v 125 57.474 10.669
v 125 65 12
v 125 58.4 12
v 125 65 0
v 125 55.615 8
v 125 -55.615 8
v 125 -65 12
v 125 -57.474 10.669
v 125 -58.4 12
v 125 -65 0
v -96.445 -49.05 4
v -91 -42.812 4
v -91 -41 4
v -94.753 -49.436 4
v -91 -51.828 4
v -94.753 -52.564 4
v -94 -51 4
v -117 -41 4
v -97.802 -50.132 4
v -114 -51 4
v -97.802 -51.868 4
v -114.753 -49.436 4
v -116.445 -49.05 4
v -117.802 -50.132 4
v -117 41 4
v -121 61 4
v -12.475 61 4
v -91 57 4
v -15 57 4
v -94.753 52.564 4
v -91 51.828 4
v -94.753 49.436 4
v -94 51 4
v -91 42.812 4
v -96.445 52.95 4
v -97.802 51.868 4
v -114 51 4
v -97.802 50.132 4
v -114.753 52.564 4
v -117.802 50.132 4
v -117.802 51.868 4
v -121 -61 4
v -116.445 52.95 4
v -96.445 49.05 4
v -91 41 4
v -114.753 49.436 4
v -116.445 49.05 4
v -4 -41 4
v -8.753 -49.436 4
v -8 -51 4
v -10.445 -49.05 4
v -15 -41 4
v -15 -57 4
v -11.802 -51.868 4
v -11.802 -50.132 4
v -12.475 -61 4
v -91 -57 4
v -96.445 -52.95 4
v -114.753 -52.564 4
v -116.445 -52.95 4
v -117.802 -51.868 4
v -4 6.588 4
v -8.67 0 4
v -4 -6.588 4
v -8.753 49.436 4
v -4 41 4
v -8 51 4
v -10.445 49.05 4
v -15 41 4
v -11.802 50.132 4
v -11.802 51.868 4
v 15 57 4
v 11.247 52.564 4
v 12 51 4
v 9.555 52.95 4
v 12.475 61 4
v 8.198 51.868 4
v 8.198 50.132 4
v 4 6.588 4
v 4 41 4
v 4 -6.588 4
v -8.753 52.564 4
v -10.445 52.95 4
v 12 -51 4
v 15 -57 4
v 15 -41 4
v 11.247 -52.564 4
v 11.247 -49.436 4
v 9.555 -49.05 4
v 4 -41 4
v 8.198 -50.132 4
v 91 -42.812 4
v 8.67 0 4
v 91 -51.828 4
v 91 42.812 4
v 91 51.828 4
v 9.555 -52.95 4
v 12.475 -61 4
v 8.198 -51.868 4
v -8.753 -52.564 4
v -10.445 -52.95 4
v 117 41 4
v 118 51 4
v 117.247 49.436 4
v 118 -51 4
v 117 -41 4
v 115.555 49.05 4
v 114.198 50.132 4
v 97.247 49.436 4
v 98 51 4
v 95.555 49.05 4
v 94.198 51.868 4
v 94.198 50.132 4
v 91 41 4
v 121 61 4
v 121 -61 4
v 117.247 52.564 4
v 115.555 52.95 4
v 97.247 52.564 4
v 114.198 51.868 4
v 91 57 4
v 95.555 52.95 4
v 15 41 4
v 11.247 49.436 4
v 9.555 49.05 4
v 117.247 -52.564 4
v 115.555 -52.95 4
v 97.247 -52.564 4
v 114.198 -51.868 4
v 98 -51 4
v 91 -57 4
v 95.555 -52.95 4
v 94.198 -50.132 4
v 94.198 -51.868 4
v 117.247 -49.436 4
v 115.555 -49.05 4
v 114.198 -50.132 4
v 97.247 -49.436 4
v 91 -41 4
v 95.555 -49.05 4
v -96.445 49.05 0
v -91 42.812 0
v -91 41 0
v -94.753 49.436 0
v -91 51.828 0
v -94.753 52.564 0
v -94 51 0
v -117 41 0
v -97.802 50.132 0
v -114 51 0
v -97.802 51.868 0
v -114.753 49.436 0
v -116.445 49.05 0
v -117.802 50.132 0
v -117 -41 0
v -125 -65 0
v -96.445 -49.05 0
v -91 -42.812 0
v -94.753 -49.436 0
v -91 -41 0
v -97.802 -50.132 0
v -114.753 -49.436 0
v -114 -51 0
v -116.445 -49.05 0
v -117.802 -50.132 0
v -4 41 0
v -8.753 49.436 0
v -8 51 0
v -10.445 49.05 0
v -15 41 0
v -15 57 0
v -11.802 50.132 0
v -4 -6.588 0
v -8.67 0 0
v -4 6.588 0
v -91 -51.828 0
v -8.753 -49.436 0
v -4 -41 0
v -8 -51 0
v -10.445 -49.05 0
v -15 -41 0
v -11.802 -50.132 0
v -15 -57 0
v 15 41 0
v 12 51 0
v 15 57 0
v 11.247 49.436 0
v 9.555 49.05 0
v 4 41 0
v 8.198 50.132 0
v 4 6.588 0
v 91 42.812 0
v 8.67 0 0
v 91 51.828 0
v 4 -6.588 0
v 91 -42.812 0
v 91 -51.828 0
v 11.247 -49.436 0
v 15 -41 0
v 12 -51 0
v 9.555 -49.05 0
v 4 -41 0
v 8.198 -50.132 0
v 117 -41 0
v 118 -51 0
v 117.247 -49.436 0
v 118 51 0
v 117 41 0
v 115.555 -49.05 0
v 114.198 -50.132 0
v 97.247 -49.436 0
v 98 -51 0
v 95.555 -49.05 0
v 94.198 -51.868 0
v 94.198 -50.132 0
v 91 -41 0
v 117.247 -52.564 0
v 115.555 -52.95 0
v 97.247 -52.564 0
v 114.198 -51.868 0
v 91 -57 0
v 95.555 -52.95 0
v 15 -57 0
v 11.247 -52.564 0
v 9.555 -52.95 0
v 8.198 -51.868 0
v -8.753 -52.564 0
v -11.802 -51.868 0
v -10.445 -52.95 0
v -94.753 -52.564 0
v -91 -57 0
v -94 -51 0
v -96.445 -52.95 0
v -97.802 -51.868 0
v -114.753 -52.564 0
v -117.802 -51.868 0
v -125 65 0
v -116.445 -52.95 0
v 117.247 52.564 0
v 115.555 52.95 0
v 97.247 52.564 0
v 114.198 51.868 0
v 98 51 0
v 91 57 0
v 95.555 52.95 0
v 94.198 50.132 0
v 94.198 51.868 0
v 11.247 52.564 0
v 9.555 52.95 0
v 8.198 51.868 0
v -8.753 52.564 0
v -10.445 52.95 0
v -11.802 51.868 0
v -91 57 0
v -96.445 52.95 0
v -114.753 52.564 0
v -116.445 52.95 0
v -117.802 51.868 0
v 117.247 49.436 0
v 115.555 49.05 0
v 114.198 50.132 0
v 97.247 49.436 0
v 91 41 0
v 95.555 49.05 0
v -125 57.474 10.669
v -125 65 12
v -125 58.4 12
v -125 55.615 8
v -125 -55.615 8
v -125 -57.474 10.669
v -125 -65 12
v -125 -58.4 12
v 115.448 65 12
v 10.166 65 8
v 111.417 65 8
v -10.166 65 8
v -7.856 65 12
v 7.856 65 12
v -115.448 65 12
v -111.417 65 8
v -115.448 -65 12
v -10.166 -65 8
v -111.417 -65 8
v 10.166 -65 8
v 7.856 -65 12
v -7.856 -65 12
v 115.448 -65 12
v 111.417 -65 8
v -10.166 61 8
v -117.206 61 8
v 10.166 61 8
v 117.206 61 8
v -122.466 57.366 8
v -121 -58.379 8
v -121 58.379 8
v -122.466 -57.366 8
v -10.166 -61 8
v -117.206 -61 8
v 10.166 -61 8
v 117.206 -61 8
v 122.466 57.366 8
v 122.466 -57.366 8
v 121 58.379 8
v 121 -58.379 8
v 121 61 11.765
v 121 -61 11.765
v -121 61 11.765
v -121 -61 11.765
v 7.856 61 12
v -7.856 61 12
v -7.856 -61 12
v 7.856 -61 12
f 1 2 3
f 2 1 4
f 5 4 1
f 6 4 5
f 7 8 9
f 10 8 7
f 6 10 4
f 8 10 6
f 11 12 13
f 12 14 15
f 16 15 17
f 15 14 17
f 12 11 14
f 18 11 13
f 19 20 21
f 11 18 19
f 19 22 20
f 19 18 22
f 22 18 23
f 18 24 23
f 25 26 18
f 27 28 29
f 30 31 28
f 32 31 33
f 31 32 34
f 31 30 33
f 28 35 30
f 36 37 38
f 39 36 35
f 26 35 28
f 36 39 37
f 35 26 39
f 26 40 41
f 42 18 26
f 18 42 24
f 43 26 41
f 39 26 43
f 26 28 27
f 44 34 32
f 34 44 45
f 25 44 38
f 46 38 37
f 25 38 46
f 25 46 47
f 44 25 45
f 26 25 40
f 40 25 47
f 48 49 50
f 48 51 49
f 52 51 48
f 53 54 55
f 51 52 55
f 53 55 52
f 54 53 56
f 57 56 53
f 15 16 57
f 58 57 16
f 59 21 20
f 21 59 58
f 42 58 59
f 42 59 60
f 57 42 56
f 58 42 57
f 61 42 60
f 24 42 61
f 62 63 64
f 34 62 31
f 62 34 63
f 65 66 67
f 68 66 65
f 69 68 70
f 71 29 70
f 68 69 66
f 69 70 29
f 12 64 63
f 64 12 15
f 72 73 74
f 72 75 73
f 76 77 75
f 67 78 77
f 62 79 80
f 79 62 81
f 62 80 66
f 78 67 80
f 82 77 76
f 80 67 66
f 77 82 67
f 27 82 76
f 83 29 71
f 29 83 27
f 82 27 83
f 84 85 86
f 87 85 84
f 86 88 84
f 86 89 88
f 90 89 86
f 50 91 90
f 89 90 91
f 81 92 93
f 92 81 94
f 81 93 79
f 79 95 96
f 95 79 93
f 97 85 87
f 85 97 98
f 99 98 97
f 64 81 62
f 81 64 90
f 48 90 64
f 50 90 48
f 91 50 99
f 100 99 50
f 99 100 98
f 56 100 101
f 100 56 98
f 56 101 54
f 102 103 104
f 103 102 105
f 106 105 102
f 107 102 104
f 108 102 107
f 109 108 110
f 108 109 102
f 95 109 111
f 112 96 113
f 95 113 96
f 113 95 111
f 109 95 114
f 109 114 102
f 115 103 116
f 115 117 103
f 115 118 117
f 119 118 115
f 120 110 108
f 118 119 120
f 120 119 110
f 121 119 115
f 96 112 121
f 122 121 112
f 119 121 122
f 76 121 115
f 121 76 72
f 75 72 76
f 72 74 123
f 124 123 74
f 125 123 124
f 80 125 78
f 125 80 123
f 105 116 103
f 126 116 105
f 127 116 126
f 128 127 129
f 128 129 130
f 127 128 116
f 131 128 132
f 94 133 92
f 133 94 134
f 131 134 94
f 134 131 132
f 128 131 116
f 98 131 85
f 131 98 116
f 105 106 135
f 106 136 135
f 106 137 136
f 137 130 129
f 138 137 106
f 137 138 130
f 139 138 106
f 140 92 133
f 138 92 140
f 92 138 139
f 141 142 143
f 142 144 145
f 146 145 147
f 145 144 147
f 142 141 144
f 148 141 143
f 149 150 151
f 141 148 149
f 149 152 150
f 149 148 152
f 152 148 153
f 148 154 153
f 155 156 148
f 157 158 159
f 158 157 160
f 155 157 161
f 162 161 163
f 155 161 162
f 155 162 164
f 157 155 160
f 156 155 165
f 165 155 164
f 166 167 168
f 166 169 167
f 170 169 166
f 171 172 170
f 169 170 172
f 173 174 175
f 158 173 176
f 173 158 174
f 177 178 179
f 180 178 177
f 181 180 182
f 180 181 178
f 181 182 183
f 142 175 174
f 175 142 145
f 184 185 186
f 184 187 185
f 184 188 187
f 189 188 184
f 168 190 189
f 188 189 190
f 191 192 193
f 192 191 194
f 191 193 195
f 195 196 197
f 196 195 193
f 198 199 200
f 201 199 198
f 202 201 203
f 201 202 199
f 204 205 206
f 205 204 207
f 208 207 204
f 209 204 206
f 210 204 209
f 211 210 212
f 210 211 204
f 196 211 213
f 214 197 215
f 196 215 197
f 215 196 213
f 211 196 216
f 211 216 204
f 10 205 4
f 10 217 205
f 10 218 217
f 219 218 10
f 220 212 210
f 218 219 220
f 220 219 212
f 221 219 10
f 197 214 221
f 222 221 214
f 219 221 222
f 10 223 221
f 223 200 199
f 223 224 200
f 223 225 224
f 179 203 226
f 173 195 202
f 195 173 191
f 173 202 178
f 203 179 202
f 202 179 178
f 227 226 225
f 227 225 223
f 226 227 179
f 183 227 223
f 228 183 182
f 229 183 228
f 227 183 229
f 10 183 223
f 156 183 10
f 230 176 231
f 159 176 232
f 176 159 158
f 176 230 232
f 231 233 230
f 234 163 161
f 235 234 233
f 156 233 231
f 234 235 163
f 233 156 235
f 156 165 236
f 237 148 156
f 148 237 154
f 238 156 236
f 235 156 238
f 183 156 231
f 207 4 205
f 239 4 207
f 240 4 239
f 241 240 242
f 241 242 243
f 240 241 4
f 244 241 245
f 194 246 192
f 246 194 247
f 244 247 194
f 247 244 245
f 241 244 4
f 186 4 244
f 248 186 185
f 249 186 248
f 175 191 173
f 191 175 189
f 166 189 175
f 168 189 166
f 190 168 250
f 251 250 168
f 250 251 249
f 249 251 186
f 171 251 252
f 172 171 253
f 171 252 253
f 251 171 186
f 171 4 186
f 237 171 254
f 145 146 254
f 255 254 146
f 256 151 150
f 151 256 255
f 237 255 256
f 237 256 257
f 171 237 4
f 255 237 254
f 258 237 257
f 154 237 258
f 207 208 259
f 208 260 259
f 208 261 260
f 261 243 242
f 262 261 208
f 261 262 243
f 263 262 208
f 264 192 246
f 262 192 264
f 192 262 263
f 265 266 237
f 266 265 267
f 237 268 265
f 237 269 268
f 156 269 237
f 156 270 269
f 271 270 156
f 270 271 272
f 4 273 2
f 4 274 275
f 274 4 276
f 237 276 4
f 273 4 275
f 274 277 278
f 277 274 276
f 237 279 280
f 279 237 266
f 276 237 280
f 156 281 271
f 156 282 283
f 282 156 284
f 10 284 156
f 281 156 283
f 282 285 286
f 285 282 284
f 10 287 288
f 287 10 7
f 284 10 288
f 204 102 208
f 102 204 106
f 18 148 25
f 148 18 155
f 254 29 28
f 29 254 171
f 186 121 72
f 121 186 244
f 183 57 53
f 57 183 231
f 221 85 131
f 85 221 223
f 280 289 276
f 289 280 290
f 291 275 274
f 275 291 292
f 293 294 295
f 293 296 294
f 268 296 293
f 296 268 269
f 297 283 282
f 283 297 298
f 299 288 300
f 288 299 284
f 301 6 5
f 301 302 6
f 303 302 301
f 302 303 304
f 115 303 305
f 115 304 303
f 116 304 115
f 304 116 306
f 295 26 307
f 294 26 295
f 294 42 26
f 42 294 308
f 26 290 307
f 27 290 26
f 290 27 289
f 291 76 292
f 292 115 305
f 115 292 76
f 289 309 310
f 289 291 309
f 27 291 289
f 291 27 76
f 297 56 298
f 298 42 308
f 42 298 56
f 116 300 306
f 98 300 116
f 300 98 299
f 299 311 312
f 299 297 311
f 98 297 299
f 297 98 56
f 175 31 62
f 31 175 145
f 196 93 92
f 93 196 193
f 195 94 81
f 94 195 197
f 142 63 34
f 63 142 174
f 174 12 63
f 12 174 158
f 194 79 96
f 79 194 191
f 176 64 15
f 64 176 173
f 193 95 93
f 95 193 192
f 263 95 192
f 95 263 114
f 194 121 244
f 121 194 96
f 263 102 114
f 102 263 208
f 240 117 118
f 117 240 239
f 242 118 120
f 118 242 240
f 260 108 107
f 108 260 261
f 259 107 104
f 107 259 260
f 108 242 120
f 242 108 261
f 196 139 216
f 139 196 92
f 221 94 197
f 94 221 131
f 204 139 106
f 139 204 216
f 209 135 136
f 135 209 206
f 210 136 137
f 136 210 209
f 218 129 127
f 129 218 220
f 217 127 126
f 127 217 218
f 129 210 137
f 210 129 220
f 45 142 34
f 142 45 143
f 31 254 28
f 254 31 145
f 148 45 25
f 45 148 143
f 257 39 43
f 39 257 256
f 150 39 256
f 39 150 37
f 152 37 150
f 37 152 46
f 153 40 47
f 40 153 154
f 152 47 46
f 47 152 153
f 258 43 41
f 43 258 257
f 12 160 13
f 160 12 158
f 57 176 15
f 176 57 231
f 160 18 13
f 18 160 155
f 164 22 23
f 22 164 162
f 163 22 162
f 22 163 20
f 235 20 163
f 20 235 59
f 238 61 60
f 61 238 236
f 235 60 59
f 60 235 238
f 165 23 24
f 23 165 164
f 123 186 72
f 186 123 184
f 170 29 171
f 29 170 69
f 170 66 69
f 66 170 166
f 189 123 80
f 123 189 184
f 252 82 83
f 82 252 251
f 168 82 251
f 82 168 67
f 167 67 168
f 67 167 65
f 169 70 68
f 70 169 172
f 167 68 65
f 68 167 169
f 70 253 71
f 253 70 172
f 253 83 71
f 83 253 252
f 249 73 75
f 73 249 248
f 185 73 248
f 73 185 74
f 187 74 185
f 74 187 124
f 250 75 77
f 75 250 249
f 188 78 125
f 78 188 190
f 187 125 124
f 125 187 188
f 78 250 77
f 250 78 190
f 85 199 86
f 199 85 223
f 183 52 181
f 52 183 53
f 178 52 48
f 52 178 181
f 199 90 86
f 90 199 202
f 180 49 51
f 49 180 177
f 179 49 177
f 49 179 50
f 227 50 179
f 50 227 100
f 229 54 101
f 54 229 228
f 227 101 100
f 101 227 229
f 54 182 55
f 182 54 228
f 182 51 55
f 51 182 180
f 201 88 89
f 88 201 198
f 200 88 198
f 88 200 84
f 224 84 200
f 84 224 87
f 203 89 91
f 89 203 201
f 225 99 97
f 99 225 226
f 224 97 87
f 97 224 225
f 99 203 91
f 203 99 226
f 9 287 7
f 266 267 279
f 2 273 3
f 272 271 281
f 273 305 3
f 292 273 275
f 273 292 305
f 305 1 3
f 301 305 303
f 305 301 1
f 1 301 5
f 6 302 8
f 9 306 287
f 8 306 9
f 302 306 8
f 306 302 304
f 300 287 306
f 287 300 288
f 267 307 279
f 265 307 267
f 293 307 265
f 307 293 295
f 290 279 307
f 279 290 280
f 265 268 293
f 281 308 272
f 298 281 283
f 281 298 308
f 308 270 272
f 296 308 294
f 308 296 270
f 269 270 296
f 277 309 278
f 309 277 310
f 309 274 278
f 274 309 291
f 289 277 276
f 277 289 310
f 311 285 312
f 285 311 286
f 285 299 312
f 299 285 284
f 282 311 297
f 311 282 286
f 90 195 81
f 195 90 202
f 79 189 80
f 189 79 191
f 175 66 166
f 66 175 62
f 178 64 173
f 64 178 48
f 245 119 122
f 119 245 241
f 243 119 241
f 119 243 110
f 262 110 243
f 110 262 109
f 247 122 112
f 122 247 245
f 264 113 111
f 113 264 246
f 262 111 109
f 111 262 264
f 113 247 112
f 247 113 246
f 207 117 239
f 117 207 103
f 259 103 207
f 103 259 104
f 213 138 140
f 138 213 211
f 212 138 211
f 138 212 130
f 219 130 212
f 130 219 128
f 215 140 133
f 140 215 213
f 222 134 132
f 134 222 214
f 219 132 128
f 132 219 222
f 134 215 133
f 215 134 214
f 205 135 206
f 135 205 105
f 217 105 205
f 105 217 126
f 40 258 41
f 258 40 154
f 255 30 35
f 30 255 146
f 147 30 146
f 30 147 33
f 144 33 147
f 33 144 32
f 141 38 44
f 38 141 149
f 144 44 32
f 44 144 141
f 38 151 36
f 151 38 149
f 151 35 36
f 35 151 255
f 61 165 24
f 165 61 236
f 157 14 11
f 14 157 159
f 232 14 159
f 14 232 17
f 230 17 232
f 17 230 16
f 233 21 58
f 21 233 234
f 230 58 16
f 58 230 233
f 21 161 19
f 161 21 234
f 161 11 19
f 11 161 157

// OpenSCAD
// file: reader-defs.scad
// Default dimensions


shaft_d = 8.2 ;         // Shaft diameter
core_d = 18 ;           // Core diameter
bevel_d = 30 ;          // Bevel inner diameter
outer_d = 40 ;          // Spool outer diameter
crank_hub_d = 25 ;      // Diameter of crank hub
handle_hub_d = 10 ;     // Diameter of handle end of crank
handle_d = 4 ;          // Diameter of handle
base_fix_d = 4 ;        // Diameter of base fixing screw hole

crank_l = 40 ;          // Length of crank (between shaft and handle centres

side_t = 4 ;            // Thickness of spool side
side_rim_t = 2 ;        // Thickness of spool side rim (beveled)
crank_hub_t = 6 ;       // Thickness of crank hub
crank_arm_t = 4 ;       // Thickness of crank arm

spool_w_all = 112 ;     // Width of spool (overall between ends)
spool_w_end = 20 ;      // Width of spool (to inside of end)
spool_w_mid = spool_w_all - 2*spool_w_end ;
                        // width of spool middle spacer

shaft_nut_af = 13 ;     // Nut diameter across faces
shaft_nut_t  = 4 ;      // Nut thickness

handle_nut_af = 7 ;     // Nut diameter across faces
handle_nut_t  = 3 ;     // Nut thickness

winder_side_h = 50 ;    // Height to centre of winder shaft
winder_side_w = 40 ;    // Width base of winder side support
winder_side_t = 4 ;     // Thickness of winder side support
winder_apex_d = 16 ;    // Radius of apex of winder side support
winder_base_t = 16 ;    // Thickness at base of winder

read_l = spool_w_all ;  // Reader bridge length (inner)
read_w = 16 ;           // Width of bridge
read_extra_w = 5 ;      // Extra width for reader bridge for tie-down
read_h = 90 ;           // Height of reader bridge above base plate
read_side_t = side_t ;  // Reader bridge side support thickness
read_side_base_t = 16 ; // Reader bridge side support thickness at base 
read_side_apex_w = 24 ;
read_side_apex_h = 4 ;
read_side_base_w = 40 ;
read_side_peg_d  = 4 ;

read_groove_w = 2.25 ;  // EL wire goove width
read_groove_d = 3 ;     // EL wire groove depth


delta = 0.01 ;          // Small value to force overlap
spacing = outer_d+10 ;  // Object spacing (layout pitch)
part_gap = 10 ;         // Spacing between exploded assembly parts
// main file
// baseplate.scad

include <reader-defs.scad> ;

module rect_frame(lx, ly, t, w) {
    // Rectangular frame on X-Y plane, centred on the origin
    //
    // lx = overall X extent
    // ly = overall Y extent
    // t  = thickness of frame
    // w  = width of frame borders
    //
    translate([0,0,t/2]) {
        difference() { 
            cube(size=[lx, ly, t], center=true) ;
            cube(size=[lx-w*2, ly-w*2, t+delta*2], center=true) ;
        }
    }
}


module rect_shell(lx, ly, t, w, h) {
    // Rectangular shell on X-Y plane, centred on the origin, consisting
    // of a rectangular frame and sides.
    //
    // lx = overall X extent
    // ly = overall Y extent
    // t  = thickness of frame and sides
    // w  = width of frame borders
    // h  = height of sides
    //
    union() {
        rect_frame(lx, ly, t, w) ;
        rect_frame(lx, ly, h, t) ;
    }
}

module diagonal_brace(lx, ly, t, w, flip=false) {
    // Rectangular diagonal brace on X-Y plane, centred on the origin:
    // fits into 'rect_frame' with same dimensions
    //
    // lx = overall X extent
    // ly = overall Y extent
    // t  = thickness of brace
    // w  = width of diagonal_brace
    // flip = if False than align lower-left to upper-right
    //        if true then align upper-left to lower-right
    //
    rot_angle = flip ? atan2(ly, lx) : atan2(-ly, lx) ;
    translate([0,0,t/2]) {
        intersection() {
            cube(size=[lx, ly, t], center=true) ; // clip region
            rotate([0,0,rot_angle])
                cube(size=[lx+ly, w, t], center=true) ;  // "stock" bar for cross-brace
        }
    }
}

module cross_brace_y(ly, px, t, w) {
    // Rectangular Y-spanning brace on X-Y plane, centred on the origin:
    //
    // ly = overall Y extent
    // px = X position
    // t  = thickness of brace
    // w  = width of brace
    //
    translate([0,0,t/2]) {
        cube(size=[w, ly, t], center=true) ;
    }
}

module mount_holes(lx, ly, t, hp, hd, px=0, py=0) {
    tx = ( px < 0 ? (px+lx/2)
         : px > 0 ? (px-lx/2)
         : 0 ) ;
    ty = ( py < 0 ? (py+ly/2)
         : py > 0 ? (py-ly/2)
         : 0 ) ;
    translate([tx,ty,t/2]) {
        union() {
            translate([-hp/2,0,0]) cylinder(t+delta*2, d=hd, center=true) ;
            translate([ hp/2,0,0]) cylinder(t+delta*2, d=hd, center=true) ;
        }
    }
}

module mount_plate(lx, ly,  t, hp, hd, px=0, py=0) {
    // Mounting plate on X-Y plane, on frame corner/edge, with 2 mounting holes on X-axis.
    // (use 'translate' to position on baseplate)
    // (use 'rotate' to change orientaton)
    //
    // lx = overall X extent of plate
    // ly = overall Y extent of plate
    // t  = thickness of plate
    // hp = hole pitch (between centres)
    // hd = hole diameter
    // px = position of plate corner - sign determines which corner
    // px = position of plate corner - sign determines which corner
    //
    tx = ( px < 0 ? (px+lx/2)
         : px > 0 ? (px-lx/2)
         : 0 ) ;
    ty = ( py < 0 ? (py+ly/2)
         : py > 0 ? (py-ly/2)
         : 0 ) ;
    translate([tx,ty,t/2]) {
        difference() {
            cube(size=[lx, ly, t], center=true) ; // plate
            translate([-hp/2,0,0]) cylinder(t+delta*2, d=hd, center=true) ;
            translate([ hp/2,0,0]) cylinder(t+delta*2, d=hd, center=true) ;
        }
    }
}

module corner_support_foot(lx, ly, t, h, px, py) {
    // Support foot on X-Y plane, on frame corner
    //
    // lx = overall X extent of foot
    // ly = overall Y extent of foot
    // t  = thickness of foot
    // h  = height of foot
    // px = position of plate corner - sign determines which corner
    // px = position of plate corner - sign determines which corner
    //
    ra = 30*sign(px)*sign(py) ;
    intersection() {
        rect_frame(abs(px)*2, abs(py)*2, h, t) ;    // clip from rectangular shell
        translate([px,py,-h])             // clip_profile for angled feet
            rotate(a=ra, v=[-px,py,0])
                linear_extrude(height=h*4, center=true) 
                    polygon([[-lx,0], [0,-ly], [+lx,0], [0,+ly] ]) ;
    }        
}

//module side_support_foot(l, t, h, px, py) {
//    // @@TODO?
//    0
//}

module side_support_foot_x(l, h, t, px, py) {
    // Support foot on X-axis-aligned edge of frame
    //
    // l  = length of support foot
    // h  = height of support foot
    // t  = thickness of support foot
    // px = X position of centre of foot 
    // py = Y position of outside of foot
    //
    translate([px, py-sign(py)*t/2, h/2]) {
        intersection() {
            cube(size=[l, t, h], center=true) ;  // "stock" bar for foot
            translate([-h/2,0,0])
                rotate([0,-30,0])
                    cube(size=[l, t, l], center=true) ;
            translate([+h/2,0,0])
                rotate([0,+30,0])
                    cube(size=[l, t, l], center=true) ;
        }
    }

}

// Tests
// rect_frame(100, 60, 4, 6);
// rect_shell(100, 60, 4, 6, 12);
// diagonal_brace(100, 60, 4, 8) ;
// diagonal_brace(100, 60, 4, 6, true) ;
// diagonal_brace(100, 60, 4, 6, false) ;
// cross_brace_y(60, 0, 4, 6) ;


// mount_plate(20, 16, 4, 12, 4, px=+44, py=+28) ;
// mount_plate(20, 16, 4, 12, 4, 0,      py=+28) ;
// mount_plate(20, 16, 4, 12, 4, px=-44, py=+28) ;
// mount_plate(20, 16, 4, 12, 4, px=+44, py=-28) ;
// mount_plate(20, 16, 4, 12, 4, px=0,   py=-28) ;
// mount_plate(20, 16, 4, 12, 4, px=-44, py=-28) ;
 
// lx = 30 ;
// ly = 20 ;
// px = 50 ;
// py = -30 ;
// 
// ra = 30*sign(px)*sign(py) ;
// 
// translate([px,py,-5])
// rotate(a=ra, v=[-px,py,0])
// linear_extrude(height=50, center=true) polygon([[-lx,0], [0,-ly], [+lx,0], [0,+ly] ]) ;

// rect_shell(100, 60, 4, 6, 6);
// corner_support_foot(30, 20, 4, 10, +50, +30) ;
// corner_support_foot(30, 20, 4, 10, +50, -30) ;
// corner_support_foot(30, 20, 4, 10, -50, +30) ;
// corner_support_foot(30, 20, 4, 10, -50, -30) ;
// side_support_foot_x(30, 10, 4, 0, +30) ;
// side_support_foot_x(30, 10, 4, 0, -30) ;

// Baseplate

base_l   = 250 ;
base_w   = 130 ;
base_t   = 4 ;
border_w = 8 ;
shell_h  = 8 ;
brace_w  = 8 ;
mount_l  = 30 ;
mount_w  = 20 ;
hole_d   = 4 ;

foot_lx  = 30 ;
foot_ly  = 20 ;
foot_h   = 12 ;

plate_px = base_l/2-base_t ;
plate_py = base_w/2-base_t ;

difference() {
    union() {

        rect_shell(base_l, base_w, base_t, border_w, shell_h);
        cross_brace_y(base_w, 0, base_t, brace_w) ;
        diagonal_brace(base_l, base_w, base_t, brace_w, flip=false) ;
        diagonal_brace(base_l, base_w, base_t, brace_w, flip=true) ;

        mount_plate(mount_l, mount_w, base_t, winder_side_w/2, hole_d, px=+plate_px, py=+plate_py ) ;
        mount_plate(mount_l, mount_w, base_t, winder_side_w/2, hole_d, px=+plate_px, py=-plate_py) ;
        mount_plate(mount_l, mount_w, base_t, winder_side_w/2, hole_d, px=-plate_px, py=+plate_py ) ;
        mount_plate(mount_l, mount_w, base_t, winder_side_w/2, hole_d, px=-plate_px, py=-plate_py) ;
        mount_plate(mount_l, mount_w, base_t, read_side_base_w/2, hole_d, 0, py=+plate_py) ;
        mount_plate(mount_l, mount_w, base_t, read_side_base_w/2, hole_d, 0, py=-plate_py) ;

        corner_support_foot(foot_lx, foot_ly, base_t, foot_h, +base_l/2, +base_w/2) ;
        corner_support_foot(foot_lx, foot_ly, base_t, foot_h, +base_l/2, -base_w/2) ;
        corner_support_foot(foot_lx, foot_ly, base_t, foot_h, -base_l/2, +base_w/2) ;
        corner_support_foot(foot_lx, foot_ly, base_t, foot_h, -base_l/2, -base_w/2) ;
        side_support_foot_x(foot_lx, foot_h, base_t, 0, +base_w/2) ;
        side_support_foot_x(foot_lx, foot_h, base_t, 0, -base_w/2) ;

    } ;
    mount_holes(mount_l, mount_w, base_t, winder_side_w/2, hole_d, px=+plate_px, py=+plate_py ) ;
    mount_holes(mount_l, mount_w, base_t, winder_side_w/2, hole_d, px=+plate_px, py=-plate_py) ;
    mount_holes(mount_l, mount_w, base_t, winder_side_w/2, hole_d, px=-plate_px, py=+plate_py ) ;
    mount_holes(mount_l, mount_w, base_t, winder_side_w/2, hole_d, px=-plate_px, py=-plate_py) ;
    mount_holes(mount_l, mount_w, base_t, read_side_base_w/2, hole_d, 0, py=+plate_py) ;
    mount_holes(mount_l, mount_w, base_t, read_side_base_w/2, hole_d, 0, py=-plate_py) ;
}
